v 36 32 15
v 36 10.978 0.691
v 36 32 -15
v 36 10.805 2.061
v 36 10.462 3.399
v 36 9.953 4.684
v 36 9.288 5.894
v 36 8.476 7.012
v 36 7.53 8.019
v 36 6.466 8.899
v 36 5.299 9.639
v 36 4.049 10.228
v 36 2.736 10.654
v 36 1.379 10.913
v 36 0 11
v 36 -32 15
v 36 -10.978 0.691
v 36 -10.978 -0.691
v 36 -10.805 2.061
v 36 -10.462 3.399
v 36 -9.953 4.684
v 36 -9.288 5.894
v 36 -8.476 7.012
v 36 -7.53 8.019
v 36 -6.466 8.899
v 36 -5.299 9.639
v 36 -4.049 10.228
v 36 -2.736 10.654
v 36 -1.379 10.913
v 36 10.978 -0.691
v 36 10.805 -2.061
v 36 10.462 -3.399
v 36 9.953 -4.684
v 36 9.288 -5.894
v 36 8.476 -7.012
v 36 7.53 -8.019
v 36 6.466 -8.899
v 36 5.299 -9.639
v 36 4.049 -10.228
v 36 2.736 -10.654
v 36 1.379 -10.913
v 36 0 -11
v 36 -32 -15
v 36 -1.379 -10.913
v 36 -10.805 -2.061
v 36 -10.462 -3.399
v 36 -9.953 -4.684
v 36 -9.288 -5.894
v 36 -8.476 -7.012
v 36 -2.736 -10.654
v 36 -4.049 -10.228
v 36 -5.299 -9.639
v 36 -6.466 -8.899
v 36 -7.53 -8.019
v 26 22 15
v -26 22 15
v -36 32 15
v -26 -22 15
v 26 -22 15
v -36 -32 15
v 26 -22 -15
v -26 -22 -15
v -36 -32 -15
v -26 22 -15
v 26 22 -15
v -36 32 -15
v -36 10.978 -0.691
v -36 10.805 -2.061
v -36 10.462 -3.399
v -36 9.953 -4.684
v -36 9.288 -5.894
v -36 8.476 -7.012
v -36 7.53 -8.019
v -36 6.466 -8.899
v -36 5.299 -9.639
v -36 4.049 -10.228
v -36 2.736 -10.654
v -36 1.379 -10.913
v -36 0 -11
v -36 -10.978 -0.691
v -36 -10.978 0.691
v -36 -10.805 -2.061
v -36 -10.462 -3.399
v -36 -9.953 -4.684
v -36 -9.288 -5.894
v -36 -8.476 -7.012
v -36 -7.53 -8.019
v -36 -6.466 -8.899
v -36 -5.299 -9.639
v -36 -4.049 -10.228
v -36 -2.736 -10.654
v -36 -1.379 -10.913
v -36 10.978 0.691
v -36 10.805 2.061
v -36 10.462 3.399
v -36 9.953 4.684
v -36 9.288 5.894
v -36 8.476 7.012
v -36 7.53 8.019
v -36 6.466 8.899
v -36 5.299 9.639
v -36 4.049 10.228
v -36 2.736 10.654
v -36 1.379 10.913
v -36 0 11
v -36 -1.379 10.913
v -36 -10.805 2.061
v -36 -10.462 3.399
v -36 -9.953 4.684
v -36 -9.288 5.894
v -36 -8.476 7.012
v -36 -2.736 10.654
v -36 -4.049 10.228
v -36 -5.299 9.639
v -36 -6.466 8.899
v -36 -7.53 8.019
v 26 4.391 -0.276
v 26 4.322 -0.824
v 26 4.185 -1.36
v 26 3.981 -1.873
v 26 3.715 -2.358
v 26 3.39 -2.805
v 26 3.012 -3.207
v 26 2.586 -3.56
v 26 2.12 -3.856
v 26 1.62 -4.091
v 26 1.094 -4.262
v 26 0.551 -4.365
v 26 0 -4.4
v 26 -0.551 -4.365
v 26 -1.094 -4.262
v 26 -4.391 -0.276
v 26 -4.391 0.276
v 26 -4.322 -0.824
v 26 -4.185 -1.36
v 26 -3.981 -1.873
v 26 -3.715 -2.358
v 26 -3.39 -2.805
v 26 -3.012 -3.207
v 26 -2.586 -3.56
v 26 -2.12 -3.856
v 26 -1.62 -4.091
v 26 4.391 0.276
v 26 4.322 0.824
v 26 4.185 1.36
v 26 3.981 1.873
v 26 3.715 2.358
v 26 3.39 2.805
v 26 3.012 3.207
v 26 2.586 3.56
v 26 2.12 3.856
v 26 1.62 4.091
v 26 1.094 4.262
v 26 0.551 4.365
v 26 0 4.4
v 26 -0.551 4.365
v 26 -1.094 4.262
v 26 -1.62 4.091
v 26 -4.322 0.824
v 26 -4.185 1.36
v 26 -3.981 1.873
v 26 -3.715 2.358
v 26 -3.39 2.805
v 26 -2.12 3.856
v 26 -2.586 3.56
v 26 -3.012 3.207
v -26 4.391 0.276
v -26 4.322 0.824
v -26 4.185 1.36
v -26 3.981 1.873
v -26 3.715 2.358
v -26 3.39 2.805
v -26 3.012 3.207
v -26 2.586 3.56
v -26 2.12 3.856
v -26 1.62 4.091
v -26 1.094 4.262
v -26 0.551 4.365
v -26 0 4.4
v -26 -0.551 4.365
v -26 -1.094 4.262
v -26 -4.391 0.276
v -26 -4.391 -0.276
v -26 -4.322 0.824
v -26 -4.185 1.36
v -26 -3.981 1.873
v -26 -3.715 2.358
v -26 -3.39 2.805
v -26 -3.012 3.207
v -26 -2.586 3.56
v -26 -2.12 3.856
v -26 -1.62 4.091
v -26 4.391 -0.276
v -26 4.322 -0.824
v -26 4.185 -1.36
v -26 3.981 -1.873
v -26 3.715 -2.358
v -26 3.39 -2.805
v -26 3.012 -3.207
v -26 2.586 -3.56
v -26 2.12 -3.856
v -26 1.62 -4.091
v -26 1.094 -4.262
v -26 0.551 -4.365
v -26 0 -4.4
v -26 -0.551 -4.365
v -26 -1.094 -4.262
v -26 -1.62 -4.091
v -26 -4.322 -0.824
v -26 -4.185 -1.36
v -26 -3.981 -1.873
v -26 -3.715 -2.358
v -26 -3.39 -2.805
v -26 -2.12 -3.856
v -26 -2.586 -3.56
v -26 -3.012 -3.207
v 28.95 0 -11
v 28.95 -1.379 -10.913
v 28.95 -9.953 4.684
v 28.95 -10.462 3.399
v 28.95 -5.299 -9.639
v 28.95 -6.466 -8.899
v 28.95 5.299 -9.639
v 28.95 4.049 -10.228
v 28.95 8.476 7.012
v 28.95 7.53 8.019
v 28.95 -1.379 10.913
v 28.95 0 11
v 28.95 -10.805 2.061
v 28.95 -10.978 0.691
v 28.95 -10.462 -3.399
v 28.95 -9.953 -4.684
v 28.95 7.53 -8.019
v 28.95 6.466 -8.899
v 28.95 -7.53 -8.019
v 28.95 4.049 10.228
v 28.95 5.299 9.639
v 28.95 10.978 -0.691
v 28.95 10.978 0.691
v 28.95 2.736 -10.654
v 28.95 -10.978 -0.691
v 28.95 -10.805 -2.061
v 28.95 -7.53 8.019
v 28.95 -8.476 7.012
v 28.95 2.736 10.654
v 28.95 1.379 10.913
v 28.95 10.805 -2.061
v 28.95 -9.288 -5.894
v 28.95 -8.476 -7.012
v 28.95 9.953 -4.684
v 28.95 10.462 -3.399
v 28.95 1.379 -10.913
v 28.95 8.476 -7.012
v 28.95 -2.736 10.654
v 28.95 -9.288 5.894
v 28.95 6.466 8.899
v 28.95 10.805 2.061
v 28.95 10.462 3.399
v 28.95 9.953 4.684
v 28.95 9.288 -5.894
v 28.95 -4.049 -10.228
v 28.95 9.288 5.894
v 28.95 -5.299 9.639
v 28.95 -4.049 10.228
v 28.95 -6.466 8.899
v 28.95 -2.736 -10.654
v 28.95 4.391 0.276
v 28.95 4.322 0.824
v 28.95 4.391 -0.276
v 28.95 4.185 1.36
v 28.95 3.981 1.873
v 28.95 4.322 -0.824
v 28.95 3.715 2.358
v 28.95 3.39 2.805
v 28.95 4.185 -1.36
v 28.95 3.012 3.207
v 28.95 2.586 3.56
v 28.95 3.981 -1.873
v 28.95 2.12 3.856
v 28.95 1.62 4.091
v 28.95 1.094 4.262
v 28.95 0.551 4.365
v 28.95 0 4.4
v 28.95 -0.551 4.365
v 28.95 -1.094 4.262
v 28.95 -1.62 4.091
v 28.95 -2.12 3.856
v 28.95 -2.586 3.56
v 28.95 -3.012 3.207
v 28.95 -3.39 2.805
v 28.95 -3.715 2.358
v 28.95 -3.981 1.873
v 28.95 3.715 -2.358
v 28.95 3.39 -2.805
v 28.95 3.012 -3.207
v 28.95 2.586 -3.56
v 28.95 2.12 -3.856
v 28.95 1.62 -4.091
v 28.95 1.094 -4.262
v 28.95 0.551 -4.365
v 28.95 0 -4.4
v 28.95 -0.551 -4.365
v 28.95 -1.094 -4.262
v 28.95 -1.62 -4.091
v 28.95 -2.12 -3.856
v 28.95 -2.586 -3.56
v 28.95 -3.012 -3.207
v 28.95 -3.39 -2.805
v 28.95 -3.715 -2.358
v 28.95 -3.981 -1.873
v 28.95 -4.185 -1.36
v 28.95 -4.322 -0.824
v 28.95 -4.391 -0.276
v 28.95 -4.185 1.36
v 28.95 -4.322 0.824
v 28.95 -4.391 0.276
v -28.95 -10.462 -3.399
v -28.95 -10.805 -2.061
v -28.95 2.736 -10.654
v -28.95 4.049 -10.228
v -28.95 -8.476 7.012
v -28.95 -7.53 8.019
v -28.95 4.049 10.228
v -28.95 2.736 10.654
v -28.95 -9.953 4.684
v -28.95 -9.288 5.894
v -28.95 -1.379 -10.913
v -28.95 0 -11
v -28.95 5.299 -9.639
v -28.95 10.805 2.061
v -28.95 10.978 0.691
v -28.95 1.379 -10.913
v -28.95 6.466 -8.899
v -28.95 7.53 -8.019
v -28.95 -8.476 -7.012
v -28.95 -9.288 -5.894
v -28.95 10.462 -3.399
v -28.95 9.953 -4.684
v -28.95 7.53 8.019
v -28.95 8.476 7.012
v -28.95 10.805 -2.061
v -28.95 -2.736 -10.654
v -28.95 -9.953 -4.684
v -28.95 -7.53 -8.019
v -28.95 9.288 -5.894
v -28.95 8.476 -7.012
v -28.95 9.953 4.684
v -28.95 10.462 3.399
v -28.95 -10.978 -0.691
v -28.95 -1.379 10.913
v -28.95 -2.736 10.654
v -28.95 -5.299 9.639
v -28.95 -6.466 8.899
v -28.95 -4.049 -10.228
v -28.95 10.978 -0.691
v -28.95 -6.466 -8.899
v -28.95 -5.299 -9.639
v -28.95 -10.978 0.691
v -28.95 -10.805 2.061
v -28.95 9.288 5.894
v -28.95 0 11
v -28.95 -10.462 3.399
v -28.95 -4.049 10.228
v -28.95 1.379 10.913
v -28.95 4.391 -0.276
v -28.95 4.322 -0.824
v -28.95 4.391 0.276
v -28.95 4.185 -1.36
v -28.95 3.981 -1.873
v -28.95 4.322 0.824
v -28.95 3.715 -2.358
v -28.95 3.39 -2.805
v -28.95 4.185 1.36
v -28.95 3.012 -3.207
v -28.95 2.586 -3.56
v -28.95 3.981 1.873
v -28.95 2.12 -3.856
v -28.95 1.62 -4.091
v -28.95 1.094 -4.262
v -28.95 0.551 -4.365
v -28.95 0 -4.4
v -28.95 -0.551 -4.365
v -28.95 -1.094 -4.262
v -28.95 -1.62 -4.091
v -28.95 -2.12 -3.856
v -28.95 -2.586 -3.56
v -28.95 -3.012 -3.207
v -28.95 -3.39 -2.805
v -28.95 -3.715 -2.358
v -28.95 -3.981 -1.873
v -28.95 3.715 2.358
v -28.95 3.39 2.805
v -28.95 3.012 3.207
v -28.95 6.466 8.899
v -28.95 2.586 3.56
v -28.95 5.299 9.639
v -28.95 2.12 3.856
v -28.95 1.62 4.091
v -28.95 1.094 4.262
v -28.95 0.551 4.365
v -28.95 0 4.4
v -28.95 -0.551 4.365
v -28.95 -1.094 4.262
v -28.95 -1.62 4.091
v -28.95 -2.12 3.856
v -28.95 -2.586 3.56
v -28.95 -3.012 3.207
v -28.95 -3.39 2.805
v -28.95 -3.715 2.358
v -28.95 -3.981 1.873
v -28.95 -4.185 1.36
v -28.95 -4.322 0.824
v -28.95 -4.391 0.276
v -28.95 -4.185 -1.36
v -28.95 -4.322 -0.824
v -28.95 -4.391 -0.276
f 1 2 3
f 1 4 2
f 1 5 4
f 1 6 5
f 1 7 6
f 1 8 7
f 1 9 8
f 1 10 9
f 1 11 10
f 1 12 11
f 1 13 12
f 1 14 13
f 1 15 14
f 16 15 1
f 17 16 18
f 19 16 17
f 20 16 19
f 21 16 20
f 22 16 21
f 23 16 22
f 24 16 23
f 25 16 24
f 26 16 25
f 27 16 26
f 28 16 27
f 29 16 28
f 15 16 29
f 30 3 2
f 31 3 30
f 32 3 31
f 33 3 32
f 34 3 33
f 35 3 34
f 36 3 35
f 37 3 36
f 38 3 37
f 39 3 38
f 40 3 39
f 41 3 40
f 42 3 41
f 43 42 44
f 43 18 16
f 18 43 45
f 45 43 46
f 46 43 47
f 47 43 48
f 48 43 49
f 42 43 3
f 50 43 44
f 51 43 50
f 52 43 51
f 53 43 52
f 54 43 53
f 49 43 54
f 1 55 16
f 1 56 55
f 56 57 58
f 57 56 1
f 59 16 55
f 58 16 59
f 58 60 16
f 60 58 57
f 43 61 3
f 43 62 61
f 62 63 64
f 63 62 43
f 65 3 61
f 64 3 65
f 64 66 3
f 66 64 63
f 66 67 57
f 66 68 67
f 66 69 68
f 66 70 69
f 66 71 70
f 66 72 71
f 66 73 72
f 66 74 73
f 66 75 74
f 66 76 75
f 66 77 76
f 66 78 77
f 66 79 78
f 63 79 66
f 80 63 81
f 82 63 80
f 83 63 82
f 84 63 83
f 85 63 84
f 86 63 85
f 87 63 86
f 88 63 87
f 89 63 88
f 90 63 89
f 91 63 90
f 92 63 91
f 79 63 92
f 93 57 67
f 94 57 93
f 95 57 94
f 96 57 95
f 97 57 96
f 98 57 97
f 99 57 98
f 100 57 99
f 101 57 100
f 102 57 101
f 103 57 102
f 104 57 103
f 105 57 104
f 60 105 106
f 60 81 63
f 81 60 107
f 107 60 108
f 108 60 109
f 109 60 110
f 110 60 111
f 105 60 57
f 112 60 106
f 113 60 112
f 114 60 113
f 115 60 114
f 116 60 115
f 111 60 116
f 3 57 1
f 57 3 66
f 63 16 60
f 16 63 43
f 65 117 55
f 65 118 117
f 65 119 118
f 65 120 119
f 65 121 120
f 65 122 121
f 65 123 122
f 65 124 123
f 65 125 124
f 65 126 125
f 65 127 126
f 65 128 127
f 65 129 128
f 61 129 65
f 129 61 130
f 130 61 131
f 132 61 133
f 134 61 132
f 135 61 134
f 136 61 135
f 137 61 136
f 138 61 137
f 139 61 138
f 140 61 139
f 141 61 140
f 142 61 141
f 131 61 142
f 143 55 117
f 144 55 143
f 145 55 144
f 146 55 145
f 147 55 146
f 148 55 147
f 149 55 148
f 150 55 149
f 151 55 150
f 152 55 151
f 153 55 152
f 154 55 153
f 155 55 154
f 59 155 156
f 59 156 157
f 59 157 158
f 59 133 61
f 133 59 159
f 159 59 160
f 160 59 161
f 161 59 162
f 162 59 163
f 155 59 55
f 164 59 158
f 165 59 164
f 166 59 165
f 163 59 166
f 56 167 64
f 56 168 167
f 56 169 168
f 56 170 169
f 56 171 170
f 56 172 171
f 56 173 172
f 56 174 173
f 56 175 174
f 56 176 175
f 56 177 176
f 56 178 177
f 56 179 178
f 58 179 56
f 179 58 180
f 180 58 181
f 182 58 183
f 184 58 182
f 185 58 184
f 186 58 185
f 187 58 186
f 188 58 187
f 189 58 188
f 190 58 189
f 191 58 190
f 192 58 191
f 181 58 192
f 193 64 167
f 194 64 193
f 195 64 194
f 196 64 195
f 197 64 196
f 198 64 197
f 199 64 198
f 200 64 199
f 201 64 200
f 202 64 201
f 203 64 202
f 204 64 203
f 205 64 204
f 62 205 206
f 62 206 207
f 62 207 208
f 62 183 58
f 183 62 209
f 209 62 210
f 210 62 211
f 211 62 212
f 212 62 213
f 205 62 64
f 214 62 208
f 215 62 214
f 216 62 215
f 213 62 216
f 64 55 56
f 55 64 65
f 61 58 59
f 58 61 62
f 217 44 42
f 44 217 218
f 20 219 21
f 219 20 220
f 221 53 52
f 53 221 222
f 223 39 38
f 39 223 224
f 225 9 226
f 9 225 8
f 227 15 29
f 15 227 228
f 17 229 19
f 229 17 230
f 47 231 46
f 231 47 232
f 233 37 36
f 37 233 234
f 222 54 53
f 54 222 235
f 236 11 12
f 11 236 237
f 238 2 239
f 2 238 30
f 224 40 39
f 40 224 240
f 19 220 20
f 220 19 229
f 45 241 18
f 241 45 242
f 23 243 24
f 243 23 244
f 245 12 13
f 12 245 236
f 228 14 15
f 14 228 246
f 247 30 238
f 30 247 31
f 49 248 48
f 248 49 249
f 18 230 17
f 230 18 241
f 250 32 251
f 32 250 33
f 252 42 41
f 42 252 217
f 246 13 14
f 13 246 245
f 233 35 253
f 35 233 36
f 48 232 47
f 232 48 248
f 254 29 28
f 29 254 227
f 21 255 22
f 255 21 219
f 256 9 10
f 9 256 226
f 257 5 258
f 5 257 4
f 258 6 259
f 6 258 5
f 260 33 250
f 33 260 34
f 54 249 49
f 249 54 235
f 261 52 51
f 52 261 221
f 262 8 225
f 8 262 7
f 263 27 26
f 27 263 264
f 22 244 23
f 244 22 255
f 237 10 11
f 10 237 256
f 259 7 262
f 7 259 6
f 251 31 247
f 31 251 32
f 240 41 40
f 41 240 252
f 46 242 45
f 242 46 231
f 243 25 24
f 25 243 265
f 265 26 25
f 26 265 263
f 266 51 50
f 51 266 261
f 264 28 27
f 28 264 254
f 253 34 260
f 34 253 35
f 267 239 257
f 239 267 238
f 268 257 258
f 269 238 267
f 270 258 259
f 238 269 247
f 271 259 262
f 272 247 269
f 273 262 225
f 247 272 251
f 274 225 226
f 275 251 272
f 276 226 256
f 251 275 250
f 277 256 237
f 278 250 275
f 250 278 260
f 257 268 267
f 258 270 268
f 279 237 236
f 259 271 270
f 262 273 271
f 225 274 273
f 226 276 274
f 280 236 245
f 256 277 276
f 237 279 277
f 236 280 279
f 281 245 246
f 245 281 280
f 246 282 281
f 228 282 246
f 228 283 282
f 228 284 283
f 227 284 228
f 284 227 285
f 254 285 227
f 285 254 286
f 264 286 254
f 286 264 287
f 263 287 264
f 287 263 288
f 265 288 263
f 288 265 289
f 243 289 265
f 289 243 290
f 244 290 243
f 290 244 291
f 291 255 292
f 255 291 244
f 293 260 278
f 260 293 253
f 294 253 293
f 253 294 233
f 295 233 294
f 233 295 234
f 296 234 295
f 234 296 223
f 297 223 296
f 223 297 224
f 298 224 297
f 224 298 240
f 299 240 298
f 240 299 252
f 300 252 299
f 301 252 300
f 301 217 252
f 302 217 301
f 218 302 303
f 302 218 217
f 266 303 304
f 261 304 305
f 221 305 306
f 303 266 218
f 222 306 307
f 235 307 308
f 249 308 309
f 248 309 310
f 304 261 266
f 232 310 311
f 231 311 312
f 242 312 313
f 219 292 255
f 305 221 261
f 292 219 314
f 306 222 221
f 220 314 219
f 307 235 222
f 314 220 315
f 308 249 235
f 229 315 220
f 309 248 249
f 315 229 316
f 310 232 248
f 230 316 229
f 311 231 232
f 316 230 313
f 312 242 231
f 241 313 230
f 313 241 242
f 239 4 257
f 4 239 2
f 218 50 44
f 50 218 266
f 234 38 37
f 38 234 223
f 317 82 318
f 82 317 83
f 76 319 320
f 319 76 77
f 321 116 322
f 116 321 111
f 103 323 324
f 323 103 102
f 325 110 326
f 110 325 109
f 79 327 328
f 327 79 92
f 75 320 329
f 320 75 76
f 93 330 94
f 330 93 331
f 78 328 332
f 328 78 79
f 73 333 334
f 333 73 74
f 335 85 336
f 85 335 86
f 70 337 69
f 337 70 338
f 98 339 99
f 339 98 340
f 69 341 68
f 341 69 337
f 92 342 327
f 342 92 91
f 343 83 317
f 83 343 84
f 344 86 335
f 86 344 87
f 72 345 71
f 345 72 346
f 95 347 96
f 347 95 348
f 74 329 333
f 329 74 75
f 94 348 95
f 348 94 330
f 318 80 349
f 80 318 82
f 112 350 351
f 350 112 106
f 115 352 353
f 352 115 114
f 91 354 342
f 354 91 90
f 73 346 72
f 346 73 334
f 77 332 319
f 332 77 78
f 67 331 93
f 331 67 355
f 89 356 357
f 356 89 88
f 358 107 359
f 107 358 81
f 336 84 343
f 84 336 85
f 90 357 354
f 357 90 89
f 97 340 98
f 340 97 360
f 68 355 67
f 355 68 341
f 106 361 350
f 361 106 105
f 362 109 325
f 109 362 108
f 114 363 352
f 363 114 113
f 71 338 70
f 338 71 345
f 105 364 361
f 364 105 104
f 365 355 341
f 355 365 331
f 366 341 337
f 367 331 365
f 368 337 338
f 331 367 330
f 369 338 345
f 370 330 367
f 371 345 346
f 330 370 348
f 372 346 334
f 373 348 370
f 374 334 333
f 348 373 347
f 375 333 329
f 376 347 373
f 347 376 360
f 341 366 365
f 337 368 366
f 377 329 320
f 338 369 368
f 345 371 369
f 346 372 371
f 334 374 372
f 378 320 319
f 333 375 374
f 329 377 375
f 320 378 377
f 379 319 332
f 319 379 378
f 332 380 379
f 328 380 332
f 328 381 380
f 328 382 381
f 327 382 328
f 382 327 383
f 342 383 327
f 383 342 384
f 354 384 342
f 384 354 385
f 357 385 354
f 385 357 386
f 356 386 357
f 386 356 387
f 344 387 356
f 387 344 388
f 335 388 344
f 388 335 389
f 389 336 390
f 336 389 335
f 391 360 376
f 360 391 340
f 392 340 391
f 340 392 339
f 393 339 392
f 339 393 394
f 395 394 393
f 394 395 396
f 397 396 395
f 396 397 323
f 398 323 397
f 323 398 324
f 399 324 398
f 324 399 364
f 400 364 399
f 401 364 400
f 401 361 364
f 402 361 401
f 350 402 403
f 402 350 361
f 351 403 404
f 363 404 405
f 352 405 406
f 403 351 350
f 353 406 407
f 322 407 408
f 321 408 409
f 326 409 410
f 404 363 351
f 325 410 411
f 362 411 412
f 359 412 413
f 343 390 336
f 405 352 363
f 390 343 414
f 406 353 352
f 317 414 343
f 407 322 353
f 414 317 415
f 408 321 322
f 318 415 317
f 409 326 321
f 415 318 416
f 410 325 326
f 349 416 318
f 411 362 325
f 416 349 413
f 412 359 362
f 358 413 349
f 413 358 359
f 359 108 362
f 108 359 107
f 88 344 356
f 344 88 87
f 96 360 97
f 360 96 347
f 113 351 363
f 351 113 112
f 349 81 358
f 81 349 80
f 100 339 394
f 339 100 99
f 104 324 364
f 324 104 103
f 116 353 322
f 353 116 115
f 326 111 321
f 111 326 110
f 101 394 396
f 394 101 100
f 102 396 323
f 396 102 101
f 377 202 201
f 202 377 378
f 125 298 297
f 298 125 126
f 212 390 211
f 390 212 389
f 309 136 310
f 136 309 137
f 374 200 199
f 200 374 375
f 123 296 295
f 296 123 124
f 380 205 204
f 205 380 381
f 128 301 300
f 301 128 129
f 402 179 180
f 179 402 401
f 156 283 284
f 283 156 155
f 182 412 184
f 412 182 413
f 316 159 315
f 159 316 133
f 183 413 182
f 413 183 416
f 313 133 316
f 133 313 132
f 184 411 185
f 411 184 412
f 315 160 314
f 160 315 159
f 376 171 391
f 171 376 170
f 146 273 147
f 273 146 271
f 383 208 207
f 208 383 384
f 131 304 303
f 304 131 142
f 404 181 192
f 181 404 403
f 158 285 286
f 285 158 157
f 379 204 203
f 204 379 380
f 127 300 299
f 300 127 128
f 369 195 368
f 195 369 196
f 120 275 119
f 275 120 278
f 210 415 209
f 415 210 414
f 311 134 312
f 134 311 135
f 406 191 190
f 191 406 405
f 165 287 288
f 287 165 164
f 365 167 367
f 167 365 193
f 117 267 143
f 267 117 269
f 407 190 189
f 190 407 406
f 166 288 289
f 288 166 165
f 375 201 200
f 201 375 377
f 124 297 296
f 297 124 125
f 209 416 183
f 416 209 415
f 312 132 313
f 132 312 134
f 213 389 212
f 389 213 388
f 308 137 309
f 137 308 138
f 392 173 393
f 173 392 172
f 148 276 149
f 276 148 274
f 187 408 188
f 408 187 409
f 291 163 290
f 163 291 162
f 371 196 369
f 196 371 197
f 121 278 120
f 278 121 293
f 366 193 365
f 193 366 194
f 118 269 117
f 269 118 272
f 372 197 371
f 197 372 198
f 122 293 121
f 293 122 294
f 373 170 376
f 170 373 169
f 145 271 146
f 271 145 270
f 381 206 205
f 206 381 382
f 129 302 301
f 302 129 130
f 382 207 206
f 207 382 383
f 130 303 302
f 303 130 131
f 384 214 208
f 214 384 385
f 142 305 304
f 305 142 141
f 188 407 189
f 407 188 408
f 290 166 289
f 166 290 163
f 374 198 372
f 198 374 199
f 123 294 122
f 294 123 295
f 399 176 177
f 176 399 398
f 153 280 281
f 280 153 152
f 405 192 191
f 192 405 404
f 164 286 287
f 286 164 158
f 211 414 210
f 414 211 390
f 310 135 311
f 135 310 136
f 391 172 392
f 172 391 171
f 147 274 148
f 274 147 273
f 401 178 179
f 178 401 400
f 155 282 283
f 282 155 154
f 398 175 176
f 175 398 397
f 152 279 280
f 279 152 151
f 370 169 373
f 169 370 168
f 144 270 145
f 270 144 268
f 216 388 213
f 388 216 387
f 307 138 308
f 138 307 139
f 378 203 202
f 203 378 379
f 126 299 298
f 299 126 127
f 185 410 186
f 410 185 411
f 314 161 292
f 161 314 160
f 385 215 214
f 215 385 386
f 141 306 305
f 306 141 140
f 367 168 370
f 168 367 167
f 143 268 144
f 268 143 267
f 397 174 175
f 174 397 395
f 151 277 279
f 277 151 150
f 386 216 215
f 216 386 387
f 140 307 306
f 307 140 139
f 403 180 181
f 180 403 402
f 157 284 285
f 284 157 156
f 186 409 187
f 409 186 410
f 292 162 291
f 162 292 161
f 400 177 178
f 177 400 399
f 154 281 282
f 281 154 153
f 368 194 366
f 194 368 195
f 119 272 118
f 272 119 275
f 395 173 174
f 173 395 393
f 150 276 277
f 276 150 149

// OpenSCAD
// file: joystick_defines.scad
// Standard skate bearing
bearing_inside_dia = 8;
bearing_outside_dia = 22;
bearing_thickness = 7;

// Arbitrary value
shaft_dia = 15;

z_fight_fudge = 0.05;
//z_fight_fudge = 0;

// Set this to 1 to translate everything to printable mode
printable_mode = 0;

// Gimba corel block sizes 
gimbal_core_x = 50;
gimbal_core_y = 30;
gimbal_core_z = gimbal_core_y;

// Gimbal frame sizes 

gimbal_frame_thickness = 10; 

// The 1.8 is 2sin(45)ish, the maximum y on the xy plane the core can occupy
gimbal_frame_x = gimbal_core_x+2*gimbal_frame_thickness+2; 
gimbal_frame_y = (gimbal_core_y * 1.8)+gimbal_frame_thickness;
gimbal_frame_z = gimbal_core_z;

circle_faces = 50;

module bearing()
{
	difference()
	{
		cylinder(h=7+2*z_fight_fudge, r = (bearing_outside_dia/2), $fn=circle_faces);

		/*translate([0,0,-z_fight_fudge])
			%cylinder(h=9, r = (bearing_inside_dia/2), $fn=circle_faces);*/
	}
}
		
// main file
include <joystick_defines.scad>

gimbal_frame();


module gimbal_frame()
{
	difference()
	{
		cube([gimbal_frame_x,gimbal_frame_y,gimbal_frame_z], center=true);
		// Boosted z_fight_fudge right up here, don't know why it's required, but it is.
		translate([0,0,-z_fight_fudge])
			cube([gimbal_frame_x-(2*gimbal_frame_thickness),gimbal_frame_y-(2*gimbal_frame_thickness),gimbal_frame_z + 30*z_fight_fudge], center=true);

		// X rot bearings 
		translate([gimbal_frame_x/2+z_fight_fudge,0,0])
			rotate([0,-90,0])
				bearing();
		translate([-gimbal_frame_x/2-z_fight_fudge,0,0])
			rotate([0,90,0])
				bearing();

		translate([-(gimbal_frame_x/2),0,0])
			rotate([0,90,0])
				cylinder(h=(gimbal_frame_x), r=(bearing_inside_dia/2)*1.1, $fn=circle_faces);
	}
}
